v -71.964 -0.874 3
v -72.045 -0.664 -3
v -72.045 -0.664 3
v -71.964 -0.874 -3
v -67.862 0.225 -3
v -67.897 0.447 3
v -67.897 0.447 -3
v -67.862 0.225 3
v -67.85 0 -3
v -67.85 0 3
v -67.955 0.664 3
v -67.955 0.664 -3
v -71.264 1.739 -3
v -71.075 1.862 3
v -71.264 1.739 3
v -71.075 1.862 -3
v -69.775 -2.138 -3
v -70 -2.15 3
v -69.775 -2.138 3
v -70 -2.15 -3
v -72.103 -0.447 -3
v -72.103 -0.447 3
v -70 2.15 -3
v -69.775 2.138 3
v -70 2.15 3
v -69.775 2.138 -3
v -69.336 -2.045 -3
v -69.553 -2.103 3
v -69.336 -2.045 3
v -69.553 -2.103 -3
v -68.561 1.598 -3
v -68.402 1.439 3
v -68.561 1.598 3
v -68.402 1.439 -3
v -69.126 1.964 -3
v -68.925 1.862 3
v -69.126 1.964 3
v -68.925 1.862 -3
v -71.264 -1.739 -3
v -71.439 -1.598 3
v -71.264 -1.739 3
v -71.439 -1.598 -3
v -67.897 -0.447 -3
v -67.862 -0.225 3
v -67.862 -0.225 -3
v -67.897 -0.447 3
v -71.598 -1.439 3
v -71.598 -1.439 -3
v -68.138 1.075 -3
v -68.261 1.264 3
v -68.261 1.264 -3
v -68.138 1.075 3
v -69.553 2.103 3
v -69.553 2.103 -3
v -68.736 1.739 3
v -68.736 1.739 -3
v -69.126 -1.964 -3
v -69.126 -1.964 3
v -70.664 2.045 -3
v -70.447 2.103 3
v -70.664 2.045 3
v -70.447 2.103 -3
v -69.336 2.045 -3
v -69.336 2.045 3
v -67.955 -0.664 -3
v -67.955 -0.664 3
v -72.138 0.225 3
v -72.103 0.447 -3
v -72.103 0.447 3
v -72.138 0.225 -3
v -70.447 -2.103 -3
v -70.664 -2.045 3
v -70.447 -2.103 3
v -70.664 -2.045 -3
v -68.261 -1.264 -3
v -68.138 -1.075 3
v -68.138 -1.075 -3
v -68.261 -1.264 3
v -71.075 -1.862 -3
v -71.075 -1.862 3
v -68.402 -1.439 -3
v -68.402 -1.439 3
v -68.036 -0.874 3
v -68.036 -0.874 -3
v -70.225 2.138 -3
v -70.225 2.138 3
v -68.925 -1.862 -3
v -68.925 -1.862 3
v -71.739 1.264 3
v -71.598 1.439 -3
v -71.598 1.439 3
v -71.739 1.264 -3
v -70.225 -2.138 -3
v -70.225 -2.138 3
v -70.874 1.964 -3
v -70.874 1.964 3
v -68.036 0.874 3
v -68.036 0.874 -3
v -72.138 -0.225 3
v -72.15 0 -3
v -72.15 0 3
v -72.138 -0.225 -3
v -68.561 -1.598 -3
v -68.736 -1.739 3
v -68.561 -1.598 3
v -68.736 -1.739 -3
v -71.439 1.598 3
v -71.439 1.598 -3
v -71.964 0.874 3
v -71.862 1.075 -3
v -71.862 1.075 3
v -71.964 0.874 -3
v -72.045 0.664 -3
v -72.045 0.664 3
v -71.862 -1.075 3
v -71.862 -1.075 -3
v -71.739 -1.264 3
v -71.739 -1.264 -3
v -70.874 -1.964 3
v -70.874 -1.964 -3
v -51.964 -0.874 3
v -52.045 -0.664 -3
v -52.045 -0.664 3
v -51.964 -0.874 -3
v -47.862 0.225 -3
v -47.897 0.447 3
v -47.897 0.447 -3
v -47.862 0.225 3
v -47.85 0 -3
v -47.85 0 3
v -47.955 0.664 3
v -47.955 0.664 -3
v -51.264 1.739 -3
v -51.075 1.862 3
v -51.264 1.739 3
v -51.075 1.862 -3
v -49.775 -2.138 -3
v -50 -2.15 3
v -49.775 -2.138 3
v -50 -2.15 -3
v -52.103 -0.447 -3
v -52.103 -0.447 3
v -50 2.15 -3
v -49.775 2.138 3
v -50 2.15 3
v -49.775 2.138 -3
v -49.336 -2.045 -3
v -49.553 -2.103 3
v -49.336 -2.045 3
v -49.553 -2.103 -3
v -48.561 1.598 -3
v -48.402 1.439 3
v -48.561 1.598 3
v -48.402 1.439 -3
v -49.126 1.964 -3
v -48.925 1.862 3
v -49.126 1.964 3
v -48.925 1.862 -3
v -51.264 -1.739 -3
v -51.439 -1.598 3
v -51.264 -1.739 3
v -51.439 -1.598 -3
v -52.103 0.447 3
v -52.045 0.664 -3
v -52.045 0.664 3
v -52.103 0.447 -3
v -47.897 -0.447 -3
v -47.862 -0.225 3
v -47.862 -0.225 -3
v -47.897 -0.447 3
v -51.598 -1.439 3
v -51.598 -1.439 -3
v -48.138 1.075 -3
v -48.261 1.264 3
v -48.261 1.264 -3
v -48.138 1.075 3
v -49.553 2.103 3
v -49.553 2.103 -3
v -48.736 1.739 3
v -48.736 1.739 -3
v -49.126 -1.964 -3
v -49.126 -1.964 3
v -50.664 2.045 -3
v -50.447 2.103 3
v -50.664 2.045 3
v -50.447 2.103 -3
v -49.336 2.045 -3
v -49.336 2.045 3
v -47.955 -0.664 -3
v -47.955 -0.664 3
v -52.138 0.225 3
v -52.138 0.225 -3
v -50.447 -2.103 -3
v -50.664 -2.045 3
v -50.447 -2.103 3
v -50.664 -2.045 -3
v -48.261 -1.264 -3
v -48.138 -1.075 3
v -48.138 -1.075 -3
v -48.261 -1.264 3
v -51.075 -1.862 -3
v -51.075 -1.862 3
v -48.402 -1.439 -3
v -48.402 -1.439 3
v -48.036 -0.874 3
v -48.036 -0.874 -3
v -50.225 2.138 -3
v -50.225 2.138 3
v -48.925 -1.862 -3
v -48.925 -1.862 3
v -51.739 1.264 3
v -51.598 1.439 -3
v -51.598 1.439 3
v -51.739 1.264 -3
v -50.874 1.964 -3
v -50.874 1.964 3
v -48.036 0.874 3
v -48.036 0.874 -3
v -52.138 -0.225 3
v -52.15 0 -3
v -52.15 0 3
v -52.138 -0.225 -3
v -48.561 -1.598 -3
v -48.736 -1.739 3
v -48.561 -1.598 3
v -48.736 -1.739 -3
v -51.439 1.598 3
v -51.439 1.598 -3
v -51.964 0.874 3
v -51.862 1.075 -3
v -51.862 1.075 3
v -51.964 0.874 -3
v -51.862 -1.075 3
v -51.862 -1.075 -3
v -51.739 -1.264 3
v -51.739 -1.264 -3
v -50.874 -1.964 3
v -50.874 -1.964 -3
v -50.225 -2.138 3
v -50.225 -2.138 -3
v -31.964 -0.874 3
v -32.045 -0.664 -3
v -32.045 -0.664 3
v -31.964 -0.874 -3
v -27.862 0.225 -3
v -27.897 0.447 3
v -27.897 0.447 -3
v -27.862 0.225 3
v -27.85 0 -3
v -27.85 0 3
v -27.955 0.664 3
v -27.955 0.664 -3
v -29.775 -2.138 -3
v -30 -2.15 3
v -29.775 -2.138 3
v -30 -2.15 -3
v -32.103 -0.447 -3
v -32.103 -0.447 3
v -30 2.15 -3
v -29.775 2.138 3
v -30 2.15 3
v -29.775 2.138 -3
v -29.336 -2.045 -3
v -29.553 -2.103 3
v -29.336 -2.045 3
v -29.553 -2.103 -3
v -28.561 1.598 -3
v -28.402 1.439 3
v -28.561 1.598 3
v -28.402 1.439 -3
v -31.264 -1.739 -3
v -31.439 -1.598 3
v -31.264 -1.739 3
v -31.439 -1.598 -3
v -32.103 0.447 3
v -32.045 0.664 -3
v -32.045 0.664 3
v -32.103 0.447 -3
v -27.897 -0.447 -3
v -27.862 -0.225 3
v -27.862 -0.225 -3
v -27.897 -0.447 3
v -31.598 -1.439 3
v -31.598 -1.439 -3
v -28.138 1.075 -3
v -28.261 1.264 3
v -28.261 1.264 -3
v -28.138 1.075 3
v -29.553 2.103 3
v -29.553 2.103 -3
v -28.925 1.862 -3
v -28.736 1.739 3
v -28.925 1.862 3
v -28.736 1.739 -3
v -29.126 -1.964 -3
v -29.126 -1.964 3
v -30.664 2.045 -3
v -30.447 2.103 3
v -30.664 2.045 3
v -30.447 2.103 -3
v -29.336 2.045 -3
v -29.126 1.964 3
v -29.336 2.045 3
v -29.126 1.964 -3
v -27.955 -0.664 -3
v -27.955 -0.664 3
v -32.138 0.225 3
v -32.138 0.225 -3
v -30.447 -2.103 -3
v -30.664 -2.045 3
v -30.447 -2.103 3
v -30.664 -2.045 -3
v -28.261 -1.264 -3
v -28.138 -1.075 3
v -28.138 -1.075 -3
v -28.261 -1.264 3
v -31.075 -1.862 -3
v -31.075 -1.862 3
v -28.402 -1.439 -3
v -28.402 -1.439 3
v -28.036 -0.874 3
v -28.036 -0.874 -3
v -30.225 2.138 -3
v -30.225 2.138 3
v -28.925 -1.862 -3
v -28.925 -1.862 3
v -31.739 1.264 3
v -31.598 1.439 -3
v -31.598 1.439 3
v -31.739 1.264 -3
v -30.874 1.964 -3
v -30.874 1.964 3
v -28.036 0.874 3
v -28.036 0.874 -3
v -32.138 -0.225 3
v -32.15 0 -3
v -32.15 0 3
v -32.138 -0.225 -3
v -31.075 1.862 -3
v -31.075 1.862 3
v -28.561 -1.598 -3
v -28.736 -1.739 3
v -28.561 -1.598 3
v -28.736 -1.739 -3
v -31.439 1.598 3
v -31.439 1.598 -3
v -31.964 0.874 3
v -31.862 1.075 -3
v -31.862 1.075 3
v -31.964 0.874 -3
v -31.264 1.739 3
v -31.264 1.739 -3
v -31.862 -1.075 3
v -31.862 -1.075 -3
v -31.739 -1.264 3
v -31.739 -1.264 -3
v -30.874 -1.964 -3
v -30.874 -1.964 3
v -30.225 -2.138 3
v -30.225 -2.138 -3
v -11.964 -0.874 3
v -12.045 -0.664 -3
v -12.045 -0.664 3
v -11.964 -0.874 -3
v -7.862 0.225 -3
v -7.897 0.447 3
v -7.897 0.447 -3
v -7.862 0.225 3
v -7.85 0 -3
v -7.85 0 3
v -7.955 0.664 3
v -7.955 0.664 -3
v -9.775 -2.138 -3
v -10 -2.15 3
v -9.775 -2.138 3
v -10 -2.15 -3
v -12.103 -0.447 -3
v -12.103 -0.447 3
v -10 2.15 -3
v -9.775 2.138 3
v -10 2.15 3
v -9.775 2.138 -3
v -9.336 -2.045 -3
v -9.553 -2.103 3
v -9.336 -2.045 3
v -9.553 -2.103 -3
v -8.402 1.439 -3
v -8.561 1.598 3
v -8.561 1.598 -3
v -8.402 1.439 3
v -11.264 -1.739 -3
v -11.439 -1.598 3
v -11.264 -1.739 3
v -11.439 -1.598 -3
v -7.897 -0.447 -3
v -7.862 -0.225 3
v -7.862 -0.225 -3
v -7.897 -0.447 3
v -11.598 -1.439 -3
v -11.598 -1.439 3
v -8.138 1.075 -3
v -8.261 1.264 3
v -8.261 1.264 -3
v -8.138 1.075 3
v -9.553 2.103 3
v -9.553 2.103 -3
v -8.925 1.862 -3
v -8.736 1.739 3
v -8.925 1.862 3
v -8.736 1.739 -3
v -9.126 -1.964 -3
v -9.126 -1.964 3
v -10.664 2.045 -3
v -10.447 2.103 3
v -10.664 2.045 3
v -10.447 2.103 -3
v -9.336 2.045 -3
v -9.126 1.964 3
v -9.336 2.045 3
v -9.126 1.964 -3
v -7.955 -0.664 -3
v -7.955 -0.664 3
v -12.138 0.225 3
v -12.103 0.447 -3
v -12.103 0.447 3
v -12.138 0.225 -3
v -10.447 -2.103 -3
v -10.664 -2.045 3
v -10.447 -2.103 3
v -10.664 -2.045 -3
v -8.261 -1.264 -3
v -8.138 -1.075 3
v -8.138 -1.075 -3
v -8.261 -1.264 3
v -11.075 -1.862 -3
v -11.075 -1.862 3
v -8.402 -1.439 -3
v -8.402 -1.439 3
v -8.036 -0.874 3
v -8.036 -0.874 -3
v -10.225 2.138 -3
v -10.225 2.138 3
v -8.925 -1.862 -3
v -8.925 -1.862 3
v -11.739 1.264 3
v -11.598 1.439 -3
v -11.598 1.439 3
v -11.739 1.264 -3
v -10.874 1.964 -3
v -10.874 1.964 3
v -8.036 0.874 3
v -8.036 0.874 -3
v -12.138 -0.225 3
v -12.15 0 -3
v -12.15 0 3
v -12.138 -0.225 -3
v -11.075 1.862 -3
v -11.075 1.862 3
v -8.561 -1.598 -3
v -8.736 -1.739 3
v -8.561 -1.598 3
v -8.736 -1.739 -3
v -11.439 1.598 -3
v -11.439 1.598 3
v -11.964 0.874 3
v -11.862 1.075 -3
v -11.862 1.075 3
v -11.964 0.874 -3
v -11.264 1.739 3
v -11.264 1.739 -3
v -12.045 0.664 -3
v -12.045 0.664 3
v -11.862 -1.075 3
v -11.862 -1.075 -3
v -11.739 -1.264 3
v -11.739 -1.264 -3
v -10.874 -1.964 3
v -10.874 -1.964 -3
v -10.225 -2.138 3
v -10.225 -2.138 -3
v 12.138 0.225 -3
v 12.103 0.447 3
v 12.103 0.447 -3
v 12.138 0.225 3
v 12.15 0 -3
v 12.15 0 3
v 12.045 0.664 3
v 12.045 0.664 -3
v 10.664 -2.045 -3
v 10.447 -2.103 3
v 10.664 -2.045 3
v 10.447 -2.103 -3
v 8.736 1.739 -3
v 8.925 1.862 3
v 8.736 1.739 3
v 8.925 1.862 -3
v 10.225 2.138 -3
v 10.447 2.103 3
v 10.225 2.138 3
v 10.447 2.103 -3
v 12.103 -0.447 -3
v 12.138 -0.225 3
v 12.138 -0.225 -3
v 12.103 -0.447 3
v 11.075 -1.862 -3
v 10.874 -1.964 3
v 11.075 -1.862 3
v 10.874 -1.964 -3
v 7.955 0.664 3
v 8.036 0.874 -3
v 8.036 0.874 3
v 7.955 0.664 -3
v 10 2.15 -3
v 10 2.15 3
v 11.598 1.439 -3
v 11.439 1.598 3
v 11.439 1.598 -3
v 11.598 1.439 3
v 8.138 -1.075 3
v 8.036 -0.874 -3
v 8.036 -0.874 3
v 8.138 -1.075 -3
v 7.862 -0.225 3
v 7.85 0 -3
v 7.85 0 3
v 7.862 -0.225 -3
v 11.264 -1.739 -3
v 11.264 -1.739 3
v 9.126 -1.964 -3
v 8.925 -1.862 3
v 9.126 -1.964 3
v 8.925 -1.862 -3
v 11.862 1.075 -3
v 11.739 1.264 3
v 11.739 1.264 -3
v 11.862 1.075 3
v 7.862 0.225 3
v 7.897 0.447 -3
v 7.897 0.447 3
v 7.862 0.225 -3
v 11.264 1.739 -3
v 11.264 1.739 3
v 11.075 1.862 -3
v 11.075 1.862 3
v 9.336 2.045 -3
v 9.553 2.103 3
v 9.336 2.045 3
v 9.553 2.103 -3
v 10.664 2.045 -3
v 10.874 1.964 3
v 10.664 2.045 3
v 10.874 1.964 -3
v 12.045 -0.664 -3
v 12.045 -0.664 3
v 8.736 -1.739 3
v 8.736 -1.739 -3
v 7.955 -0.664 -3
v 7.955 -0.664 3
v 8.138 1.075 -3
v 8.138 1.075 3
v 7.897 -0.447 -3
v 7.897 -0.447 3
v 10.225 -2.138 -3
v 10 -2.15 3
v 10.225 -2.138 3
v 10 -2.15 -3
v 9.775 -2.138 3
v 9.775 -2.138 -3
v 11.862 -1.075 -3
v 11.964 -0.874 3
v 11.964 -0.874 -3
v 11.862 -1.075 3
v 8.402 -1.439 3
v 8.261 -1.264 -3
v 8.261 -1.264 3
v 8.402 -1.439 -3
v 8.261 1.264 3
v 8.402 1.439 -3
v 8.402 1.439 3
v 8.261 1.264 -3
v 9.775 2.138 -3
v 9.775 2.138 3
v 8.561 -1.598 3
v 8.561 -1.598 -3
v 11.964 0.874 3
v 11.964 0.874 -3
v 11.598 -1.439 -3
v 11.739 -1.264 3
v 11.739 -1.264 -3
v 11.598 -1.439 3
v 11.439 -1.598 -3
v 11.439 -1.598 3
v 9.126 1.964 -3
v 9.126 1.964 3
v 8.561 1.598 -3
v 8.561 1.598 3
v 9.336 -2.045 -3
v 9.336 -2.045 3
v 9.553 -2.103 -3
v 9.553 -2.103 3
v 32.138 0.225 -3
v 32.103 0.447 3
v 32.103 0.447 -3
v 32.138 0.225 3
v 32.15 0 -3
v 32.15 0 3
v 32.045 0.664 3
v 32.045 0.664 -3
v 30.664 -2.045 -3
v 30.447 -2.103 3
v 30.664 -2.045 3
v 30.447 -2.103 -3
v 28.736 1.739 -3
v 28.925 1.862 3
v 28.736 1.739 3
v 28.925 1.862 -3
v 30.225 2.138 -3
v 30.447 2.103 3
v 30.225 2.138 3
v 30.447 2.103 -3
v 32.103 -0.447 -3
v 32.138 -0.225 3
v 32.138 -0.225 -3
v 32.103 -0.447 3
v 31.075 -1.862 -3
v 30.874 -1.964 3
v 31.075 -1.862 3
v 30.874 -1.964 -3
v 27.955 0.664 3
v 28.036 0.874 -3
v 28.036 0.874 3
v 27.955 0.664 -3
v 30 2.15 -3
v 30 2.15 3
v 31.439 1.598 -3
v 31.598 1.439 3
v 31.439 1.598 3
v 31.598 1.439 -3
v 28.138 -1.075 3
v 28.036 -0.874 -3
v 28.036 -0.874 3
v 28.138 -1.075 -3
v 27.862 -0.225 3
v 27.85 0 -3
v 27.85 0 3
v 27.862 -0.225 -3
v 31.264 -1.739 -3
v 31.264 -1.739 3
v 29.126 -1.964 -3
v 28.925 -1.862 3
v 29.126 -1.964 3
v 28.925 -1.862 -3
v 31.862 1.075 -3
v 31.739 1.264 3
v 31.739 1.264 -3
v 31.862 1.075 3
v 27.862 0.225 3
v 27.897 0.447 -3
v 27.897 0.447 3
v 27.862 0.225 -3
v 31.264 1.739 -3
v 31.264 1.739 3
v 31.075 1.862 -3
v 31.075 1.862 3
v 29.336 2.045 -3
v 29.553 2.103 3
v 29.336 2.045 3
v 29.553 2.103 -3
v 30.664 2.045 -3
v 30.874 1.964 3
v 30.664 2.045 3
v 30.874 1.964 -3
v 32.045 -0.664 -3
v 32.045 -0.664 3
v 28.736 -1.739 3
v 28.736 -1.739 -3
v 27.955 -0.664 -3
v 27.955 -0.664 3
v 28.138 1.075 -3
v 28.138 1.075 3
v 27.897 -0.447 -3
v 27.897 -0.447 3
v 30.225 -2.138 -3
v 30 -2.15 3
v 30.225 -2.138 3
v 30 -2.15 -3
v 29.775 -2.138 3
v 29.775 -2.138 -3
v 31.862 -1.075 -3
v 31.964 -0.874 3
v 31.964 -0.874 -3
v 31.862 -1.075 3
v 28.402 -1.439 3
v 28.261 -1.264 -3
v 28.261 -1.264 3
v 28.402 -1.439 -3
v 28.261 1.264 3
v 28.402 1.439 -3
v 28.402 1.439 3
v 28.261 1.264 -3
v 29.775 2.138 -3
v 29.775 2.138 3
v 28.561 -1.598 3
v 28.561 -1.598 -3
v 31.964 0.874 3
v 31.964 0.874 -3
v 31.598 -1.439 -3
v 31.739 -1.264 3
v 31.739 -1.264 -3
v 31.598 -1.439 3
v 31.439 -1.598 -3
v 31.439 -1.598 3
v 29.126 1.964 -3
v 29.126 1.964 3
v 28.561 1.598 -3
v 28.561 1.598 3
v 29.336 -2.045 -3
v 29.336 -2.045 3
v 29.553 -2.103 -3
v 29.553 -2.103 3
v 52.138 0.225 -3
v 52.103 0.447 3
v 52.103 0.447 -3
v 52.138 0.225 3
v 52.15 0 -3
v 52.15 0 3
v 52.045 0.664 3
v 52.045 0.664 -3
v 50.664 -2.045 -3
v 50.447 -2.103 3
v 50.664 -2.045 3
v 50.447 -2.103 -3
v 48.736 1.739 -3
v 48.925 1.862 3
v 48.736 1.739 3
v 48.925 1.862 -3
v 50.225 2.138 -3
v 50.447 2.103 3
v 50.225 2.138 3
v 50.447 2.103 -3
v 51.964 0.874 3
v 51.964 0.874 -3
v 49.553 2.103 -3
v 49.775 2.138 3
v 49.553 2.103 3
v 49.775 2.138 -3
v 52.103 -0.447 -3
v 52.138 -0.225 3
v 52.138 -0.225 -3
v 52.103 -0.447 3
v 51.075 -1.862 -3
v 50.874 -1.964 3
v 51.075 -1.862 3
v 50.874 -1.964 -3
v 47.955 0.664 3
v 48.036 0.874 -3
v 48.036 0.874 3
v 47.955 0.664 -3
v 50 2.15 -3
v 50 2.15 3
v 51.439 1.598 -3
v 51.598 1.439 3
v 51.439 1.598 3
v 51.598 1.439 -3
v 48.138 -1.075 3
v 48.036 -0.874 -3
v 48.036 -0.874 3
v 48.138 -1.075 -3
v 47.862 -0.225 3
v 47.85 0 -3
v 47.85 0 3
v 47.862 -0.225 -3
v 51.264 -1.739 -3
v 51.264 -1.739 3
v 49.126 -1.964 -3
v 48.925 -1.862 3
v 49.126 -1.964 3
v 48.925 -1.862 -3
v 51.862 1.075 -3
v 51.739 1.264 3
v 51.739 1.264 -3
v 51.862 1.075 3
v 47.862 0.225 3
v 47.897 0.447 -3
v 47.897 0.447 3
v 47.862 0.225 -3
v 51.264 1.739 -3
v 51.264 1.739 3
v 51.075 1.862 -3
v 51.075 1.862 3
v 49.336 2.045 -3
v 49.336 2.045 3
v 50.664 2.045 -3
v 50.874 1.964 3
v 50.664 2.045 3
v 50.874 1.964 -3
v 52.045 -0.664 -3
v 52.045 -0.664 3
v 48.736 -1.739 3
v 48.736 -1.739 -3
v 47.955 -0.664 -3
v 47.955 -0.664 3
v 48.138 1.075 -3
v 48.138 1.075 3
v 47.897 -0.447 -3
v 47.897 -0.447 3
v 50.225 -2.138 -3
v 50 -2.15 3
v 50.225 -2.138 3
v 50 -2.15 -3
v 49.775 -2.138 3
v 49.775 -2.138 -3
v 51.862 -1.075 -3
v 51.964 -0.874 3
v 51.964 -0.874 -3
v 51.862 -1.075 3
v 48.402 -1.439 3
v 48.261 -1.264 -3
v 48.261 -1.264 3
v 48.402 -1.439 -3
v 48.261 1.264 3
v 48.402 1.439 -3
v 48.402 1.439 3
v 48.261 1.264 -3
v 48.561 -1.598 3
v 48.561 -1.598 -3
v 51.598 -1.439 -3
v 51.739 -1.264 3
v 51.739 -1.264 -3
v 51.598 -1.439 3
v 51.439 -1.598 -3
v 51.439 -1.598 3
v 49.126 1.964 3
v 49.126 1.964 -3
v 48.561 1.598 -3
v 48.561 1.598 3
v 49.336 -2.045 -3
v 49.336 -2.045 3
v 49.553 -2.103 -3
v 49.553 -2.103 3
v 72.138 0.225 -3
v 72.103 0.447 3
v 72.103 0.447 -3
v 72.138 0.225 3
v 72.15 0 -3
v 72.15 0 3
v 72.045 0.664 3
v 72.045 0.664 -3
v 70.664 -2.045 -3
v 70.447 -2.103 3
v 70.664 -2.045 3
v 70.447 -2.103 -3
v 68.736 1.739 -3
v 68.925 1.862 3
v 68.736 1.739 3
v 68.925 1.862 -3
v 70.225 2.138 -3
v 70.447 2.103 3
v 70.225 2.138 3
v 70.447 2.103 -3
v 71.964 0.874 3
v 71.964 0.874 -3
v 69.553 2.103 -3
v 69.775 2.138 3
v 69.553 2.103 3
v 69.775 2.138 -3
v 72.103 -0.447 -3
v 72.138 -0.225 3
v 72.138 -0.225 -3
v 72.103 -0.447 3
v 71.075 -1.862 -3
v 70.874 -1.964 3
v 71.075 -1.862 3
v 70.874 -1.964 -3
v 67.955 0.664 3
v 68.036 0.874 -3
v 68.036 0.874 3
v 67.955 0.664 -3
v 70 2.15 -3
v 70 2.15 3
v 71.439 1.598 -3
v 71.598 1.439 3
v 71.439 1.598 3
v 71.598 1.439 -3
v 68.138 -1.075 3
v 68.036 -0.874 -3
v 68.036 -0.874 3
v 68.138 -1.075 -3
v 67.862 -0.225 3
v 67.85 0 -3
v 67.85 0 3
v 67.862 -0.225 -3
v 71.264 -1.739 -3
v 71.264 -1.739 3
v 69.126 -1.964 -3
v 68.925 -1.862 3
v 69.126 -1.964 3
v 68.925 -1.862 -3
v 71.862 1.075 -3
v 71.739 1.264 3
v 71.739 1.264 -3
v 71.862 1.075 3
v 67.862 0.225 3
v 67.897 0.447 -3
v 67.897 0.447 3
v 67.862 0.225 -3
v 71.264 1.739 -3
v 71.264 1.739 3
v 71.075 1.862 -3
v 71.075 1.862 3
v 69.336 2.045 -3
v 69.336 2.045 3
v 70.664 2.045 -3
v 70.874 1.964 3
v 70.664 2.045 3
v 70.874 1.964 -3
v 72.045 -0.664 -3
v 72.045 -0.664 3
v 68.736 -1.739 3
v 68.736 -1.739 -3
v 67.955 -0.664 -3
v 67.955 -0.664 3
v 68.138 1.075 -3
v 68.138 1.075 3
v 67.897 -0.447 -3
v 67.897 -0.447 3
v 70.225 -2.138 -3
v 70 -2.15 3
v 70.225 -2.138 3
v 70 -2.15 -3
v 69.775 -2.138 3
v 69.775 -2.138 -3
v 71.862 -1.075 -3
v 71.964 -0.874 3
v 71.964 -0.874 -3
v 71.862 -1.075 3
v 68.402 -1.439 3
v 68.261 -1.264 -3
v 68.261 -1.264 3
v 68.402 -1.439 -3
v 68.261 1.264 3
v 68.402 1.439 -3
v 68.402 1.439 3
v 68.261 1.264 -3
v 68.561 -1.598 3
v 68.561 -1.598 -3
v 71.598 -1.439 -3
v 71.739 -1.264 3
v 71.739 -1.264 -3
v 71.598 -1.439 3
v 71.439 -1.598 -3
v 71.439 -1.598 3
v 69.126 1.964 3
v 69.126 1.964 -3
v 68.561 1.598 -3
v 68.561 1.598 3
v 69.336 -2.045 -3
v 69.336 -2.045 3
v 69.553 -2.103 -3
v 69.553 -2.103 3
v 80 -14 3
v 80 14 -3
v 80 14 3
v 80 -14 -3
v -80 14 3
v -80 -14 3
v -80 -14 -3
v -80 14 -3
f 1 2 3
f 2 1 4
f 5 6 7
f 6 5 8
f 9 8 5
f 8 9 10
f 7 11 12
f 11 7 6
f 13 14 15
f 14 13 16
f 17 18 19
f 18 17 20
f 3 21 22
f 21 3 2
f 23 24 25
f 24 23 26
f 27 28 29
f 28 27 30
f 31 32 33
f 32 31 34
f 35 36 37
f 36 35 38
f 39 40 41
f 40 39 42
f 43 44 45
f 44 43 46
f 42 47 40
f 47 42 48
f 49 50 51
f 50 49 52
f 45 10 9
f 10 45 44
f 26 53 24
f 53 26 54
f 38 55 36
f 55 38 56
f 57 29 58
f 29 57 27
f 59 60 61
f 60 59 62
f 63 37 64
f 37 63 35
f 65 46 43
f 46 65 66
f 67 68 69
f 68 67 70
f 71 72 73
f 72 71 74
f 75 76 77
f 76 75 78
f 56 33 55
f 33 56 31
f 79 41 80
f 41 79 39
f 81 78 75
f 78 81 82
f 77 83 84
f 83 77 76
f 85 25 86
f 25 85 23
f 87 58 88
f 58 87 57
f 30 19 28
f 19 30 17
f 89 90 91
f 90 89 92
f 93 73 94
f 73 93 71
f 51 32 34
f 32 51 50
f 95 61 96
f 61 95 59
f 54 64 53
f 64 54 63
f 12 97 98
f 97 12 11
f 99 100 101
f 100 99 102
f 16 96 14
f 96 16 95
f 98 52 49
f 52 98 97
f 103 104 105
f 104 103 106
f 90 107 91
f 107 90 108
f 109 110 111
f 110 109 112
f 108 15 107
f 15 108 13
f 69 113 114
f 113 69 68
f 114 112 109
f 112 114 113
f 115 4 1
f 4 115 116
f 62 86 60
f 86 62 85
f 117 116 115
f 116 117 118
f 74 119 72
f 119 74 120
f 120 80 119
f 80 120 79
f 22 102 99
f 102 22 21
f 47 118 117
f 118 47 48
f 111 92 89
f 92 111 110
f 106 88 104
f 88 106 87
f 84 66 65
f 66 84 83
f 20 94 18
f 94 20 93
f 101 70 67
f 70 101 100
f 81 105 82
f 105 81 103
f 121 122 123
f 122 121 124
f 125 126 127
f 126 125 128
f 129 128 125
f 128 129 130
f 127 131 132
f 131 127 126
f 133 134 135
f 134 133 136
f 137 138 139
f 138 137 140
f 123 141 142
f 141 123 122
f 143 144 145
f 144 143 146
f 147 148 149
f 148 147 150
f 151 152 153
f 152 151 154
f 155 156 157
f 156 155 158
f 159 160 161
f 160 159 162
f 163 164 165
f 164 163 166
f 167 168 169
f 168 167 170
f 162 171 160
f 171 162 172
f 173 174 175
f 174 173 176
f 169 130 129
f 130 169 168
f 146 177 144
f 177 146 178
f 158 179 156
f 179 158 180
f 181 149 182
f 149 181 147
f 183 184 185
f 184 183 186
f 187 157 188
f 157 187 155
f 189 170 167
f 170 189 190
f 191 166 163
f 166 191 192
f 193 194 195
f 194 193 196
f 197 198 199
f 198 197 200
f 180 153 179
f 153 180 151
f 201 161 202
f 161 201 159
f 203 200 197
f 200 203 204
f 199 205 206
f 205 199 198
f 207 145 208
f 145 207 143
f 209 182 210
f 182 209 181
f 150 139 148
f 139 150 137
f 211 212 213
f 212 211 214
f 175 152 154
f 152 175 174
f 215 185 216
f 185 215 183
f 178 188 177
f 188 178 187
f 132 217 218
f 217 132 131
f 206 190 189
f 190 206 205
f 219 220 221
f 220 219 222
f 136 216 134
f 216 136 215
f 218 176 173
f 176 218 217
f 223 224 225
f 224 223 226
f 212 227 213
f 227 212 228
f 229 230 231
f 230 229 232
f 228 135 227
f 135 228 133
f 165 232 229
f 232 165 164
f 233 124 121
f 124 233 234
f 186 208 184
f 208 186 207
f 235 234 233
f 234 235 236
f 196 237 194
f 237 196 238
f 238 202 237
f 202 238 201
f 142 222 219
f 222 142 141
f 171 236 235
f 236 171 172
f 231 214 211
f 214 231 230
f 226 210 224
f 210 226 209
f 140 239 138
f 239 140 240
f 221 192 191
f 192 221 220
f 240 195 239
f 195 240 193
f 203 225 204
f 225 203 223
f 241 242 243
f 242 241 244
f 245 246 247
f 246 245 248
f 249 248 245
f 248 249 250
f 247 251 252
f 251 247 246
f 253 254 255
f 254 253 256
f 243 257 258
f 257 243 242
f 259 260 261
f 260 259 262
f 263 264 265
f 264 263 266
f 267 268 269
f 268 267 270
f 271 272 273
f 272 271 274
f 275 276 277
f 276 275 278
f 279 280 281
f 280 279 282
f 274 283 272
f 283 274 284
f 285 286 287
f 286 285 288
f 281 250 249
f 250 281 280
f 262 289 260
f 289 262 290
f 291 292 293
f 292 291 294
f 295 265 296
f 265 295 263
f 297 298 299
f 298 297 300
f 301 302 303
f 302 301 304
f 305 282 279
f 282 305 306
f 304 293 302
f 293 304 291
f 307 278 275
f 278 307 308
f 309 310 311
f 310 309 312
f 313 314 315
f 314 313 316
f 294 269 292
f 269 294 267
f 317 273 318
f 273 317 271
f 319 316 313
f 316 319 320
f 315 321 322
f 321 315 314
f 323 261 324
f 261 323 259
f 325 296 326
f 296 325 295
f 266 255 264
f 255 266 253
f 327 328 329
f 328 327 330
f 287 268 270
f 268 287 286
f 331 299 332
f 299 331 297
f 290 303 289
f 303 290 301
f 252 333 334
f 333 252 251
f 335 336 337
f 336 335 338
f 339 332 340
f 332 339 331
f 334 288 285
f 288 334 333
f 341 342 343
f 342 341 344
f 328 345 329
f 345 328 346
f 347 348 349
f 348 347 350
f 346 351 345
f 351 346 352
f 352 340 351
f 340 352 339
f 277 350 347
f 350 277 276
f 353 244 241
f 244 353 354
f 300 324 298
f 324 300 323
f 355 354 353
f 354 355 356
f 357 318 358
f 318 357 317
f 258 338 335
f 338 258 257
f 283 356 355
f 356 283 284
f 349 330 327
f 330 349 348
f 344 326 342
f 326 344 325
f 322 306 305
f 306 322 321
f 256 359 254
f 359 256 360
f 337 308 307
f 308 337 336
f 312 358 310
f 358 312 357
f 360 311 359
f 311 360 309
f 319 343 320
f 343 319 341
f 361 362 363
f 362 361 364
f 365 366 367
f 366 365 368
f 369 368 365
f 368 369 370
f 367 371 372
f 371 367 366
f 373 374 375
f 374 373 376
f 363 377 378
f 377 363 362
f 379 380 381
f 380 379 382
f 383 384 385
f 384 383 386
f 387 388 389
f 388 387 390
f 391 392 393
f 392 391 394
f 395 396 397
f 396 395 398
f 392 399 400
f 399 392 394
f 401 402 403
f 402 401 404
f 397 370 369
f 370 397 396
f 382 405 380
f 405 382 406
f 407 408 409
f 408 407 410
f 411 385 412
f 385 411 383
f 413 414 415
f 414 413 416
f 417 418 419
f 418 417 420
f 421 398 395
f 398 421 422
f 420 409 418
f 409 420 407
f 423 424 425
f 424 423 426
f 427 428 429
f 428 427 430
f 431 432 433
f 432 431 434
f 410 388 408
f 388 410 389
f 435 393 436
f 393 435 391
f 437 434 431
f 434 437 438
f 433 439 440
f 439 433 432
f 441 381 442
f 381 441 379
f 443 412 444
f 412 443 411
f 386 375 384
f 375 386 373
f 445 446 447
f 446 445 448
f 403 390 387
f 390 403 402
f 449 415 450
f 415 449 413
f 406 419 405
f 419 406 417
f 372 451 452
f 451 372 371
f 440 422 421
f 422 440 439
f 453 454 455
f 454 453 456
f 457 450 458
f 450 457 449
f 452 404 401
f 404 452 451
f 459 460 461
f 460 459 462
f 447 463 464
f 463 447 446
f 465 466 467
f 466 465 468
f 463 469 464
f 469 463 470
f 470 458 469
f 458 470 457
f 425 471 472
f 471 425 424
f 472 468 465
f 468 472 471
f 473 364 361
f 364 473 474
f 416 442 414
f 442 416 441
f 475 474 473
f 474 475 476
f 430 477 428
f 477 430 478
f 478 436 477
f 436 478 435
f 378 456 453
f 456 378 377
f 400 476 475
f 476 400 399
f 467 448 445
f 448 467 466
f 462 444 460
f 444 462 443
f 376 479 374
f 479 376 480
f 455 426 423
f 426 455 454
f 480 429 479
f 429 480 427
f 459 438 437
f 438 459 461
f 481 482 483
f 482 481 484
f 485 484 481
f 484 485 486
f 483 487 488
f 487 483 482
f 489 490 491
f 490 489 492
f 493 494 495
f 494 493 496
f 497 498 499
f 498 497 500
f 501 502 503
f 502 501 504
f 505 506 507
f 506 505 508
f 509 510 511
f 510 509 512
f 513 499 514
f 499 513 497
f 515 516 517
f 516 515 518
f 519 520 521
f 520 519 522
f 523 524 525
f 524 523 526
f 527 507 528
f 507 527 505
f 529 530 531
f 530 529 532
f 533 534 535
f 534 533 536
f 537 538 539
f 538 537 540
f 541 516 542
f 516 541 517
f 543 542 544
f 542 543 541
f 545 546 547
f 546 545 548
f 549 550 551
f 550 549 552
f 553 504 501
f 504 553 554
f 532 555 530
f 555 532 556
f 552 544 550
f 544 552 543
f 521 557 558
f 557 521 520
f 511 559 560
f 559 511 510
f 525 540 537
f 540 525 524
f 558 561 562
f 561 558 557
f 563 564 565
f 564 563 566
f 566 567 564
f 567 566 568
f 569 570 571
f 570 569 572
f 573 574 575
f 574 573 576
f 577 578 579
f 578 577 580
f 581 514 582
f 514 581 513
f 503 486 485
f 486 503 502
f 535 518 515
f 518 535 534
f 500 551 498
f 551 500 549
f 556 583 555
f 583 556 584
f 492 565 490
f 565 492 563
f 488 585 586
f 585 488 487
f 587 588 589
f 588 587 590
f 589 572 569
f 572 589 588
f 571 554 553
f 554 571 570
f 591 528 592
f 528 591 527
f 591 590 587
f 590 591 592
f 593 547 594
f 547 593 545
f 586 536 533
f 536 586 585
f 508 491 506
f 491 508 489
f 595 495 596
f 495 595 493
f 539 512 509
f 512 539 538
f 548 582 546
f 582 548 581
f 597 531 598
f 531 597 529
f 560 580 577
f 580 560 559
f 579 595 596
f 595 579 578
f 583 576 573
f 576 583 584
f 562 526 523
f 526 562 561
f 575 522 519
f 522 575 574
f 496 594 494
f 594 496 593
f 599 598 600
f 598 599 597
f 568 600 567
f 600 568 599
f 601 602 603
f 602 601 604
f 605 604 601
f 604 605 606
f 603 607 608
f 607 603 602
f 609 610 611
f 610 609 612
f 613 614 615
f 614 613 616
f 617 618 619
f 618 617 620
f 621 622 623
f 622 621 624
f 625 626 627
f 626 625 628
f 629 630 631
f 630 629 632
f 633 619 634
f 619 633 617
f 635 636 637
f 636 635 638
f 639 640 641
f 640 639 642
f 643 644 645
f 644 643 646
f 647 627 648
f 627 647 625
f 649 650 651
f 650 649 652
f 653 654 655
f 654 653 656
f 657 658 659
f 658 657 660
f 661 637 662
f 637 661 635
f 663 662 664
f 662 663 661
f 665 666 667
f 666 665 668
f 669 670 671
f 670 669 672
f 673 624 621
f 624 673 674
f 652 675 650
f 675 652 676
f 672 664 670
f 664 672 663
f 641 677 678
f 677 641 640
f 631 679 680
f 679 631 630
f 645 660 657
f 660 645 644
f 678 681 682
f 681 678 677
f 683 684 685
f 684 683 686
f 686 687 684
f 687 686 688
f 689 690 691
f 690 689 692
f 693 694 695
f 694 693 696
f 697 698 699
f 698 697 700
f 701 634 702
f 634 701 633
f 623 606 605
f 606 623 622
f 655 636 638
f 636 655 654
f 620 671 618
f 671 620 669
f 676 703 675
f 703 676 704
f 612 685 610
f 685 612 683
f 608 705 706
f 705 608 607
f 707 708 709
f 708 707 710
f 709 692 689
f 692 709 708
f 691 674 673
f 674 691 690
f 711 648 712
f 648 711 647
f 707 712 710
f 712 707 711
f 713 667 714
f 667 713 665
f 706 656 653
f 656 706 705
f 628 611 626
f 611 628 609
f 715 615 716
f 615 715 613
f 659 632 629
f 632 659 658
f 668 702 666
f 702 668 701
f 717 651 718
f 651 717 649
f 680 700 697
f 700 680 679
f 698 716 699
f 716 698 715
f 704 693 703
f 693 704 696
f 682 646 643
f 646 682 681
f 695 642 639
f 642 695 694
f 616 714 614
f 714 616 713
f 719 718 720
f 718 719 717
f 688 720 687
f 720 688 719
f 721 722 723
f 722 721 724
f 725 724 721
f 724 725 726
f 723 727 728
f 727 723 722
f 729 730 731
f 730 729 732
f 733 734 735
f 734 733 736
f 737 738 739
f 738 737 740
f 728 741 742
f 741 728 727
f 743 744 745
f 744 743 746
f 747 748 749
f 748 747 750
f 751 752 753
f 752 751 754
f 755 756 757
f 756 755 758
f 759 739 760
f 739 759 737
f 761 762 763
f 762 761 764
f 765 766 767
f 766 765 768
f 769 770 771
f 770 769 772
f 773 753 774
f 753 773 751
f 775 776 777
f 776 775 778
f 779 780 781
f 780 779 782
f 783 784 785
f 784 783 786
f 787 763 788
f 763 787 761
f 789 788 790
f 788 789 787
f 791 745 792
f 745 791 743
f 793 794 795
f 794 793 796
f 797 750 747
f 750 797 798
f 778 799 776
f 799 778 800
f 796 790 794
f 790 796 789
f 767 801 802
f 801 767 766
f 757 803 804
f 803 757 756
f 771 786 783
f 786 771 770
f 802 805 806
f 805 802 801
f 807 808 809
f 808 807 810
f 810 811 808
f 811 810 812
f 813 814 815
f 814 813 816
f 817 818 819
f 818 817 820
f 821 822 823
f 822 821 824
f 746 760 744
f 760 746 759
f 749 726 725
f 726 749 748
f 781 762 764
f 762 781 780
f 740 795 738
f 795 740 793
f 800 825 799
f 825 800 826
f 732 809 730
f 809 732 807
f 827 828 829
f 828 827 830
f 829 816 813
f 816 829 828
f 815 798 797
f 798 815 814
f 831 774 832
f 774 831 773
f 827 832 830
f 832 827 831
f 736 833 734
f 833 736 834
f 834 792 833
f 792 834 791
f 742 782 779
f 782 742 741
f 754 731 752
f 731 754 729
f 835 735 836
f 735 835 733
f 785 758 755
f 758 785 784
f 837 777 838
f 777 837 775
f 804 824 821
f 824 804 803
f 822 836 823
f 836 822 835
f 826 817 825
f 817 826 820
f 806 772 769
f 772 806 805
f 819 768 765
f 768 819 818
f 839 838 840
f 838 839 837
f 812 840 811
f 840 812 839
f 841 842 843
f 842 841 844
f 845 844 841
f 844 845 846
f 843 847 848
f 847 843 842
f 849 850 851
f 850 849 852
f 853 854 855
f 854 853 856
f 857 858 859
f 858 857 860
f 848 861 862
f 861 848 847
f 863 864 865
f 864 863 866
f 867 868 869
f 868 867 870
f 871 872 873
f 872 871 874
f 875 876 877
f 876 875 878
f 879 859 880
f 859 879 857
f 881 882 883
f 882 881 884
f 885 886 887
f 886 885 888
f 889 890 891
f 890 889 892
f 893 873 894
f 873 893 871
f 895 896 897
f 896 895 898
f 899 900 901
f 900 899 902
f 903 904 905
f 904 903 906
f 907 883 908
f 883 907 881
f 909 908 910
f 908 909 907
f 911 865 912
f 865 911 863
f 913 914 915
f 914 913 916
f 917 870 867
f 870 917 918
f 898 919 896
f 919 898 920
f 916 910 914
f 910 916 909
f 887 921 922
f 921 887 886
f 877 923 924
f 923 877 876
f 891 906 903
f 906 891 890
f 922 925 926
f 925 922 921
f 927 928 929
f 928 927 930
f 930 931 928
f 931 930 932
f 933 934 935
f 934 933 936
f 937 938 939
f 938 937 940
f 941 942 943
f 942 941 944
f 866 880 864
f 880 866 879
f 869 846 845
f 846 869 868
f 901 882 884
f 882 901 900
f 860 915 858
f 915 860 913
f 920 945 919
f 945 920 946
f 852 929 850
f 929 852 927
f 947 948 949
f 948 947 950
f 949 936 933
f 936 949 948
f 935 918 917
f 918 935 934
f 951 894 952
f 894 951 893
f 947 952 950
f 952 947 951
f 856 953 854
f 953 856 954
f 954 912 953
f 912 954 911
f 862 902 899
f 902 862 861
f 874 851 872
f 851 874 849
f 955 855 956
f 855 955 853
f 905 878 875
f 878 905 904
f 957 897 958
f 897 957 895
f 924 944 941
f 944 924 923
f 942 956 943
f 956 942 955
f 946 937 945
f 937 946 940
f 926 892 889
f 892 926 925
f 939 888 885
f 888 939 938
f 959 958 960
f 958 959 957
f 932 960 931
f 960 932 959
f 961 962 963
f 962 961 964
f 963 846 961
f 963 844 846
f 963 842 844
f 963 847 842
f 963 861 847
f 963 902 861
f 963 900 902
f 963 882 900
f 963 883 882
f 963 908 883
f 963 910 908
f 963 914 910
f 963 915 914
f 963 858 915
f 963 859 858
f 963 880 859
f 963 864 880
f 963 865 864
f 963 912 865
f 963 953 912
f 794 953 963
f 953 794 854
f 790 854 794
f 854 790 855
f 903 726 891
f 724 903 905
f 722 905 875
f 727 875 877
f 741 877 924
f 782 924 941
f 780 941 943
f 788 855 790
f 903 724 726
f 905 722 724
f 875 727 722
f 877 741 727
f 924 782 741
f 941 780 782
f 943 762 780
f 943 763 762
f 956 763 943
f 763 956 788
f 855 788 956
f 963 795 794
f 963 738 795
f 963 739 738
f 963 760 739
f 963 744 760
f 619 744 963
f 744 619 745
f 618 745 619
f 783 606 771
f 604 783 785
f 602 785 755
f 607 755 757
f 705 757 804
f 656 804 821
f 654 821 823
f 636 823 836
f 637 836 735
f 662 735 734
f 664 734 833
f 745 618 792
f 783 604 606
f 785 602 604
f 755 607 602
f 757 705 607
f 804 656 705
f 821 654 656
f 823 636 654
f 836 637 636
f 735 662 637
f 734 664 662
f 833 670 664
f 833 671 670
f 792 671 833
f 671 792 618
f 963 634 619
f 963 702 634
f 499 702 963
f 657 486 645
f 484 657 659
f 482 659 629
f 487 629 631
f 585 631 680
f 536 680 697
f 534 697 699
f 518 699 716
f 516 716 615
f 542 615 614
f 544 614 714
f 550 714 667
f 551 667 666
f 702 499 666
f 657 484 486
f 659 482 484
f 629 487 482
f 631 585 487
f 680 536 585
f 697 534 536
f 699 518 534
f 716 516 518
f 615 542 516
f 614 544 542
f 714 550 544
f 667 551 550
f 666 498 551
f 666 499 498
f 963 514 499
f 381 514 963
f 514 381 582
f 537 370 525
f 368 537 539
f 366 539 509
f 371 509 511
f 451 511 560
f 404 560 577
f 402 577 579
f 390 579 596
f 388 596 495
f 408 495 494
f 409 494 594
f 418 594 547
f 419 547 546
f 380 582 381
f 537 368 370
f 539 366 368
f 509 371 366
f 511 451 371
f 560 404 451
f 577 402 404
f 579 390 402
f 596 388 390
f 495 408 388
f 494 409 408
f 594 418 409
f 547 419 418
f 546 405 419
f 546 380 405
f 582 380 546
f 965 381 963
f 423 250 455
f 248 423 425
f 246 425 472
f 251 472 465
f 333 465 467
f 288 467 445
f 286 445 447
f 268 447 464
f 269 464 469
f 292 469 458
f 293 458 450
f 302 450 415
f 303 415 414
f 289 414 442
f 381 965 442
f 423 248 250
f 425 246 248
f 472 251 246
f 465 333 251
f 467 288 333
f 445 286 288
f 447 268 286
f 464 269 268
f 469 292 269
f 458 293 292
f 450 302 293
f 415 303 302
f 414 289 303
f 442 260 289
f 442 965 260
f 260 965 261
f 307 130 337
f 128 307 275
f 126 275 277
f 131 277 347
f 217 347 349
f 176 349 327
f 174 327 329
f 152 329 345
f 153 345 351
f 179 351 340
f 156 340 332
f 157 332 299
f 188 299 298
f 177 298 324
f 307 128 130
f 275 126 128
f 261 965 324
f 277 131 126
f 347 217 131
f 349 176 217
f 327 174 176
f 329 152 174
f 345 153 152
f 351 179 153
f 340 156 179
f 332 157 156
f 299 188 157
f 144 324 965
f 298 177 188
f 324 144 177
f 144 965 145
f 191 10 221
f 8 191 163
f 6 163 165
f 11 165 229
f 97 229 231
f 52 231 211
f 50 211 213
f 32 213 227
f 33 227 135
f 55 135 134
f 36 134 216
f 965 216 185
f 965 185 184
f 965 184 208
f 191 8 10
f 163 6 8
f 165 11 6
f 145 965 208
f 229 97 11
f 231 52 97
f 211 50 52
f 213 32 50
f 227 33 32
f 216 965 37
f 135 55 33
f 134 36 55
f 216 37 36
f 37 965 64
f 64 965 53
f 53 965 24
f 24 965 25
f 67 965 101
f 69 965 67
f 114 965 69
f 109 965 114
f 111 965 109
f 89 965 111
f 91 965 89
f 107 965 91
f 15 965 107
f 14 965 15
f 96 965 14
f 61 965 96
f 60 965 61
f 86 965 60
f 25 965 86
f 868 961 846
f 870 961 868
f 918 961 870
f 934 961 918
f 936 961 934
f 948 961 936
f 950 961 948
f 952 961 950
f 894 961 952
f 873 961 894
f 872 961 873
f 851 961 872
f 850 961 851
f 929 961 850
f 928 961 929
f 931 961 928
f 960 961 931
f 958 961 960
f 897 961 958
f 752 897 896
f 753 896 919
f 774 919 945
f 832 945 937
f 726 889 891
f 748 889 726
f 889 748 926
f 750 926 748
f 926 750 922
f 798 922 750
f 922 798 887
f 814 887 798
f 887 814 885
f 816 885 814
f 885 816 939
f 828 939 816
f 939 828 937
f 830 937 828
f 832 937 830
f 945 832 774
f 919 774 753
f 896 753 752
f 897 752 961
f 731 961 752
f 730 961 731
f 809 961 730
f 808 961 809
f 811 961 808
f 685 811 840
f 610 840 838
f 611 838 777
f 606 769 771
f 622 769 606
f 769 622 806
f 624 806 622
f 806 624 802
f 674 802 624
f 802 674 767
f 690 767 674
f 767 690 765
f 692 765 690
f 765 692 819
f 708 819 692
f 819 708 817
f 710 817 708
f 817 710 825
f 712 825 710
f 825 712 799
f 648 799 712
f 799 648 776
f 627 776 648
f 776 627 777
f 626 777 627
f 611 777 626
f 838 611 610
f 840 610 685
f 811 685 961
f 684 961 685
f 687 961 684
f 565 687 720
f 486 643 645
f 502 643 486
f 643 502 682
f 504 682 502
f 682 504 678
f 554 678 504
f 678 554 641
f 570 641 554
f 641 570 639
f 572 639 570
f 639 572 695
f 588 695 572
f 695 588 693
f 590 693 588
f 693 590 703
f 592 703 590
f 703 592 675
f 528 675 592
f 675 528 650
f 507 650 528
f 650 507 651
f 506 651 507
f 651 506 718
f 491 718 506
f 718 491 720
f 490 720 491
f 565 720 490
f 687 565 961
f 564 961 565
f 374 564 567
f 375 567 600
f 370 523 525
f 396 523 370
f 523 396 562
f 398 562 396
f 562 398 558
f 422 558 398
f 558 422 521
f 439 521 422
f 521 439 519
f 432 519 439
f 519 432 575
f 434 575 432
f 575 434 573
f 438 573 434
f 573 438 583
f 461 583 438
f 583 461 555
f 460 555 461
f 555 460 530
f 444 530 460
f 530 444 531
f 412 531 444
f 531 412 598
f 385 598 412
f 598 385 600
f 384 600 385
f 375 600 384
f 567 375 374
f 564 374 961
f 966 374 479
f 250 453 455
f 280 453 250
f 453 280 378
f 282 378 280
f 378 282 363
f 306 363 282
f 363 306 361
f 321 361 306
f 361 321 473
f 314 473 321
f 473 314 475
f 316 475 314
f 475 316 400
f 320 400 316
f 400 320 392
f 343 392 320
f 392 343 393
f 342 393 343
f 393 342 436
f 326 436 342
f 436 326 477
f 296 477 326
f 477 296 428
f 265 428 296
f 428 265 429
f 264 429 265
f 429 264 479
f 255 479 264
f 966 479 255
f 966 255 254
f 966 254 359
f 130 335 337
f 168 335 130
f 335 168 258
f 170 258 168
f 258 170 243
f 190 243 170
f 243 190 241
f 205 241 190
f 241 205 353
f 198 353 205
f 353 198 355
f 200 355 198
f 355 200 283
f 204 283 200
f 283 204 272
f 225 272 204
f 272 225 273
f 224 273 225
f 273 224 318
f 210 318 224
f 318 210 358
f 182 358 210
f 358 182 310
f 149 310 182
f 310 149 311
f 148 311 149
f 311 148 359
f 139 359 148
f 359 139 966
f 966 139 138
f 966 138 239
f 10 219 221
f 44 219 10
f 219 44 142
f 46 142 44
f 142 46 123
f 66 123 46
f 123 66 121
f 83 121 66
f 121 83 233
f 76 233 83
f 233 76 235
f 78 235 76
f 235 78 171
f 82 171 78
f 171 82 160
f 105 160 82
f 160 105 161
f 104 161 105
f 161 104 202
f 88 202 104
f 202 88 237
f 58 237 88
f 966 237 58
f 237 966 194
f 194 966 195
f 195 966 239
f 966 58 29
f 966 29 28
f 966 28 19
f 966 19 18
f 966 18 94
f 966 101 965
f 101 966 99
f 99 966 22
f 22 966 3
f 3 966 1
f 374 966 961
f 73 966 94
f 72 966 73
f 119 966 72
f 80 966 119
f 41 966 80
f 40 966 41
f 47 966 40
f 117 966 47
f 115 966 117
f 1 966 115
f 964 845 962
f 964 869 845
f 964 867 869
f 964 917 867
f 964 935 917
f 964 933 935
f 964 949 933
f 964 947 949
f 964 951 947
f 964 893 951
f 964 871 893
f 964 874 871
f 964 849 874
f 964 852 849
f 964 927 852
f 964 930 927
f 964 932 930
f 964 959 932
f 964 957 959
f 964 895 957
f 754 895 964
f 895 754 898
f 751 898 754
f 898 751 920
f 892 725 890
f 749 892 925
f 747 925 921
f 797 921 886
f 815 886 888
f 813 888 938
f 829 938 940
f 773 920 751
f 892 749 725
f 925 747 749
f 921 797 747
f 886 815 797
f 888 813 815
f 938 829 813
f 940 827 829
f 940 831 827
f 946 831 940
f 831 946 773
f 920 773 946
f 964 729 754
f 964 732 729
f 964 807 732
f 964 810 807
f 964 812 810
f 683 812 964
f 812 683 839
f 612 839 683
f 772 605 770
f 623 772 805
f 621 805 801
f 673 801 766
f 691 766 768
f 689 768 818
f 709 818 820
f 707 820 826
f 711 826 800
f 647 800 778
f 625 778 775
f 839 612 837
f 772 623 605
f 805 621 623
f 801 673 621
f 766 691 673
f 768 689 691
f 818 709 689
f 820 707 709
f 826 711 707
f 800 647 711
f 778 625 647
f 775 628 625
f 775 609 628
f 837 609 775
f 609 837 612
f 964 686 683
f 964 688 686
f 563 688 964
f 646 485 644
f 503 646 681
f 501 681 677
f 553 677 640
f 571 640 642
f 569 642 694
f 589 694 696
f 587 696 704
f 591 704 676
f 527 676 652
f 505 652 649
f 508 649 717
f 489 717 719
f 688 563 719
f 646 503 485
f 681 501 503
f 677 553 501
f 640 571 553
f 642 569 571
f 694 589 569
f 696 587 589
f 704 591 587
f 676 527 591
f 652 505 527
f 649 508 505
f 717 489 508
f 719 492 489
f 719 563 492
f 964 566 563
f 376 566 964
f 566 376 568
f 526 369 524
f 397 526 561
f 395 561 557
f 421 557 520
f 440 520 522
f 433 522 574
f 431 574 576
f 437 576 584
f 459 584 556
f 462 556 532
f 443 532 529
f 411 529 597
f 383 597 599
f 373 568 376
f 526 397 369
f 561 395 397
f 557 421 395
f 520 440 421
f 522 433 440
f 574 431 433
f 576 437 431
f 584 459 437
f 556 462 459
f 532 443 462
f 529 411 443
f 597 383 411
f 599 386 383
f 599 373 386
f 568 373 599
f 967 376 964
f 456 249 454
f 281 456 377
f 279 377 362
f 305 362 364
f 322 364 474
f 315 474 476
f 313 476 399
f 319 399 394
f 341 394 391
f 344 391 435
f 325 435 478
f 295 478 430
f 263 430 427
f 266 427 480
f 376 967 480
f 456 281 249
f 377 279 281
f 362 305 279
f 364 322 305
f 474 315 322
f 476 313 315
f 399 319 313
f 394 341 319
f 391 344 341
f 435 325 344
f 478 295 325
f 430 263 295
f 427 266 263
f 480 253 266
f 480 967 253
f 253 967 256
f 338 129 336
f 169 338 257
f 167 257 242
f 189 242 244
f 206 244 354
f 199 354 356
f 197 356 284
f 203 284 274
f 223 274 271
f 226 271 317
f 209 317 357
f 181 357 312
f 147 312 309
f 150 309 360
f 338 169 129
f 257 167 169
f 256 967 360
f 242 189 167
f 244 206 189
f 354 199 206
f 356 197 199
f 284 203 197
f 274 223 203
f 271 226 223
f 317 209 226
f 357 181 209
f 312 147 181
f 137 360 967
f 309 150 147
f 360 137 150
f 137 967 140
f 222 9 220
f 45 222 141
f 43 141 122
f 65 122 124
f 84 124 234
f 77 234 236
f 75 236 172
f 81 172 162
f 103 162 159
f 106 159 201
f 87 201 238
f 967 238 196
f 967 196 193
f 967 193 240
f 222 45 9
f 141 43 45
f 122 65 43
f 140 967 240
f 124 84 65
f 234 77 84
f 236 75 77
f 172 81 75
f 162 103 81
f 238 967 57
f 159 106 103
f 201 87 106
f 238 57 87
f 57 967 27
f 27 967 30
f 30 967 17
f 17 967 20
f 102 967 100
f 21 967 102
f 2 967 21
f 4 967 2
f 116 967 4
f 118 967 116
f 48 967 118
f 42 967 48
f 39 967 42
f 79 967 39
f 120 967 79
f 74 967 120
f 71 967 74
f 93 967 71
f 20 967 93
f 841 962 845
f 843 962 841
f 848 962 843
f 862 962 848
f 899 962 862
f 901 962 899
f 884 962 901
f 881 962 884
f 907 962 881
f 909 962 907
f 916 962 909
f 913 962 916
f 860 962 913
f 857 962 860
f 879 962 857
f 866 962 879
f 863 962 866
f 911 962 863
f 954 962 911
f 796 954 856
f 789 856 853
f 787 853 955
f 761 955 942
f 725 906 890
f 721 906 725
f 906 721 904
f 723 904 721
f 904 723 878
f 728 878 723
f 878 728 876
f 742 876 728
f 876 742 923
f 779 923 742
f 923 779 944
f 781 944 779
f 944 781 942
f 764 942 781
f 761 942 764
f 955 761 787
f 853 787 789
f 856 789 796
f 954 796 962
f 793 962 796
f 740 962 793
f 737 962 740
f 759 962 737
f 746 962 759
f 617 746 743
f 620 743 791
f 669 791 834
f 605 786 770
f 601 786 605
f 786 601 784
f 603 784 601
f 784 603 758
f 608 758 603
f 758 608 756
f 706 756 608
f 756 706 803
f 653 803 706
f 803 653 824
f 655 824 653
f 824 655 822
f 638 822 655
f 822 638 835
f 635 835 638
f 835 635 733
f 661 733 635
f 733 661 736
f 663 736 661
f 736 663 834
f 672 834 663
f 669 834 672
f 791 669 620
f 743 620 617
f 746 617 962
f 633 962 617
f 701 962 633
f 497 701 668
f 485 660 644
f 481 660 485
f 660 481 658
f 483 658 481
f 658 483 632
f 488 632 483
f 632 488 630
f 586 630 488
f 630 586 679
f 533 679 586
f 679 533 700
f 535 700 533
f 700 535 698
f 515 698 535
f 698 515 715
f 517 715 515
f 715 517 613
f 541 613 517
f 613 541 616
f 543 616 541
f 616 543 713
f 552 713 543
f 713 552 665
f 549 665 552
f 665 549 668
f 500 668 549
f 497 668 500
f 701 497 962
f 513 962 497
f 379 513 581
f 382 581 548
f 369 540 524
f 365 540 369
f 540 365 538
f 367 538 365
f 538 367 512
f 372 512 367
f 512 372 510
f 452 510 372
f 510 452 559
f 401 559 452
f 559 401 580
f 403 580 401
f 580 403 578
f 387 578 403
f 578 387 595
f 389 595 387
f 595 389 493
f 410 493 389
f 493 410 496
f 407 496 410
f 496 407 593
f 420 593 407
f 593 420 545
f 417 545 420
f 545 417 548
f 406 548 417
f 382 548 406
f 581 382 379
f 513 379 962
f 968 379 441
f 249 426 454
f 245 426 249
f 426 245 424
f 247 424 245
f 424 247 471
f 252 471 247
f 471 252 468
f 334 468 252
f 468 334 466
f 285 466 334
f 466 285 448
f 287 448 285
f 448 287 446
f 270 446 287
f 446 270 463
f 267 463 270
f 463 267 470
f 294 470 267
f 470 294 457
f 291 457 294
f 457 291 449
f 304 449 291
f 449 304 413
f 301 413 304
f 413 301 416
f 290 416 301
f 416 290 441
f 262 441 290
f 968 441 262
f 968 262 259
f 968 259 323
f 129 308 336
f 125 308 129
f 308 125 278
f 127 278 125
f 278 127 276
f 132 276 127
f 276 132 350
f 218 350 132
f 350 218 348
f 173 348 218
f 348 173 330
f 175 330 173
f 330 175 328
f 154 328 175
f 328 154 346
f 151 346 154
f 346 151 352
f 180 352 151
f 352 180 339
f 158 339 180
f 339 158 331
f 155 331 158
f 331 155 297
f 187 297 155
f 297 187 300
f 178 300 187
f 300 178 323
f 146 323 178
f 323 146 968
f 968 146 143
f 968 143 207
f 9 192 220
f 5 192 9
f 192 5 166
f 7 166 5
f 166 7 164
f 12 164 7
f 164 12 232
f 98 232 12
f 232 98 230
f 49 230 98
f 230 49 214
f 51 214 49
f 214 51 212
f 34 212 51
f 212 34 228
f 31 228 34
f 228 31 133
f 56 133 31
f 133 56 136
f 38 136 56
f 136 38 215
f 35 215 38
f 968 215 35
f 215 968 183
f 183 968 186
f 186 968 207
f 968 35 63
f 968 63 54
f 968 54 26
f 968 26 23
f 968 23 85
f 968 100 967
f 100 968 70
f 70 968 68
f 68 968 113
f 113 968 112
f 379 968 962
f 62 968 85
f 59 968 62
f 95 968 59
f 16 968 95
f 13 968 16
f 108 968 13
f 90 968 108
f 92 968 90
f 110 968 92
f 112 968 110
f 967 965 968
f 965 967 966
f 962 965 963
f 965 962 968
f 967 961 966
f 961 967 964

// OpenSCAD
// Linear rail spacer strip.
$fn = 60;
eps = 0.02;
length = 160;
width = 28;
thickness = 6;
hole_pitch = 20;
difference() {
    cube([length,width,thickness],center=true);
    for (x=[-length/2+10:hole_pitch:length/2-10]) translate([x,0,-thickness/2-eps]) cylinder(d=4.3,h=thickness+2*eps);
}
